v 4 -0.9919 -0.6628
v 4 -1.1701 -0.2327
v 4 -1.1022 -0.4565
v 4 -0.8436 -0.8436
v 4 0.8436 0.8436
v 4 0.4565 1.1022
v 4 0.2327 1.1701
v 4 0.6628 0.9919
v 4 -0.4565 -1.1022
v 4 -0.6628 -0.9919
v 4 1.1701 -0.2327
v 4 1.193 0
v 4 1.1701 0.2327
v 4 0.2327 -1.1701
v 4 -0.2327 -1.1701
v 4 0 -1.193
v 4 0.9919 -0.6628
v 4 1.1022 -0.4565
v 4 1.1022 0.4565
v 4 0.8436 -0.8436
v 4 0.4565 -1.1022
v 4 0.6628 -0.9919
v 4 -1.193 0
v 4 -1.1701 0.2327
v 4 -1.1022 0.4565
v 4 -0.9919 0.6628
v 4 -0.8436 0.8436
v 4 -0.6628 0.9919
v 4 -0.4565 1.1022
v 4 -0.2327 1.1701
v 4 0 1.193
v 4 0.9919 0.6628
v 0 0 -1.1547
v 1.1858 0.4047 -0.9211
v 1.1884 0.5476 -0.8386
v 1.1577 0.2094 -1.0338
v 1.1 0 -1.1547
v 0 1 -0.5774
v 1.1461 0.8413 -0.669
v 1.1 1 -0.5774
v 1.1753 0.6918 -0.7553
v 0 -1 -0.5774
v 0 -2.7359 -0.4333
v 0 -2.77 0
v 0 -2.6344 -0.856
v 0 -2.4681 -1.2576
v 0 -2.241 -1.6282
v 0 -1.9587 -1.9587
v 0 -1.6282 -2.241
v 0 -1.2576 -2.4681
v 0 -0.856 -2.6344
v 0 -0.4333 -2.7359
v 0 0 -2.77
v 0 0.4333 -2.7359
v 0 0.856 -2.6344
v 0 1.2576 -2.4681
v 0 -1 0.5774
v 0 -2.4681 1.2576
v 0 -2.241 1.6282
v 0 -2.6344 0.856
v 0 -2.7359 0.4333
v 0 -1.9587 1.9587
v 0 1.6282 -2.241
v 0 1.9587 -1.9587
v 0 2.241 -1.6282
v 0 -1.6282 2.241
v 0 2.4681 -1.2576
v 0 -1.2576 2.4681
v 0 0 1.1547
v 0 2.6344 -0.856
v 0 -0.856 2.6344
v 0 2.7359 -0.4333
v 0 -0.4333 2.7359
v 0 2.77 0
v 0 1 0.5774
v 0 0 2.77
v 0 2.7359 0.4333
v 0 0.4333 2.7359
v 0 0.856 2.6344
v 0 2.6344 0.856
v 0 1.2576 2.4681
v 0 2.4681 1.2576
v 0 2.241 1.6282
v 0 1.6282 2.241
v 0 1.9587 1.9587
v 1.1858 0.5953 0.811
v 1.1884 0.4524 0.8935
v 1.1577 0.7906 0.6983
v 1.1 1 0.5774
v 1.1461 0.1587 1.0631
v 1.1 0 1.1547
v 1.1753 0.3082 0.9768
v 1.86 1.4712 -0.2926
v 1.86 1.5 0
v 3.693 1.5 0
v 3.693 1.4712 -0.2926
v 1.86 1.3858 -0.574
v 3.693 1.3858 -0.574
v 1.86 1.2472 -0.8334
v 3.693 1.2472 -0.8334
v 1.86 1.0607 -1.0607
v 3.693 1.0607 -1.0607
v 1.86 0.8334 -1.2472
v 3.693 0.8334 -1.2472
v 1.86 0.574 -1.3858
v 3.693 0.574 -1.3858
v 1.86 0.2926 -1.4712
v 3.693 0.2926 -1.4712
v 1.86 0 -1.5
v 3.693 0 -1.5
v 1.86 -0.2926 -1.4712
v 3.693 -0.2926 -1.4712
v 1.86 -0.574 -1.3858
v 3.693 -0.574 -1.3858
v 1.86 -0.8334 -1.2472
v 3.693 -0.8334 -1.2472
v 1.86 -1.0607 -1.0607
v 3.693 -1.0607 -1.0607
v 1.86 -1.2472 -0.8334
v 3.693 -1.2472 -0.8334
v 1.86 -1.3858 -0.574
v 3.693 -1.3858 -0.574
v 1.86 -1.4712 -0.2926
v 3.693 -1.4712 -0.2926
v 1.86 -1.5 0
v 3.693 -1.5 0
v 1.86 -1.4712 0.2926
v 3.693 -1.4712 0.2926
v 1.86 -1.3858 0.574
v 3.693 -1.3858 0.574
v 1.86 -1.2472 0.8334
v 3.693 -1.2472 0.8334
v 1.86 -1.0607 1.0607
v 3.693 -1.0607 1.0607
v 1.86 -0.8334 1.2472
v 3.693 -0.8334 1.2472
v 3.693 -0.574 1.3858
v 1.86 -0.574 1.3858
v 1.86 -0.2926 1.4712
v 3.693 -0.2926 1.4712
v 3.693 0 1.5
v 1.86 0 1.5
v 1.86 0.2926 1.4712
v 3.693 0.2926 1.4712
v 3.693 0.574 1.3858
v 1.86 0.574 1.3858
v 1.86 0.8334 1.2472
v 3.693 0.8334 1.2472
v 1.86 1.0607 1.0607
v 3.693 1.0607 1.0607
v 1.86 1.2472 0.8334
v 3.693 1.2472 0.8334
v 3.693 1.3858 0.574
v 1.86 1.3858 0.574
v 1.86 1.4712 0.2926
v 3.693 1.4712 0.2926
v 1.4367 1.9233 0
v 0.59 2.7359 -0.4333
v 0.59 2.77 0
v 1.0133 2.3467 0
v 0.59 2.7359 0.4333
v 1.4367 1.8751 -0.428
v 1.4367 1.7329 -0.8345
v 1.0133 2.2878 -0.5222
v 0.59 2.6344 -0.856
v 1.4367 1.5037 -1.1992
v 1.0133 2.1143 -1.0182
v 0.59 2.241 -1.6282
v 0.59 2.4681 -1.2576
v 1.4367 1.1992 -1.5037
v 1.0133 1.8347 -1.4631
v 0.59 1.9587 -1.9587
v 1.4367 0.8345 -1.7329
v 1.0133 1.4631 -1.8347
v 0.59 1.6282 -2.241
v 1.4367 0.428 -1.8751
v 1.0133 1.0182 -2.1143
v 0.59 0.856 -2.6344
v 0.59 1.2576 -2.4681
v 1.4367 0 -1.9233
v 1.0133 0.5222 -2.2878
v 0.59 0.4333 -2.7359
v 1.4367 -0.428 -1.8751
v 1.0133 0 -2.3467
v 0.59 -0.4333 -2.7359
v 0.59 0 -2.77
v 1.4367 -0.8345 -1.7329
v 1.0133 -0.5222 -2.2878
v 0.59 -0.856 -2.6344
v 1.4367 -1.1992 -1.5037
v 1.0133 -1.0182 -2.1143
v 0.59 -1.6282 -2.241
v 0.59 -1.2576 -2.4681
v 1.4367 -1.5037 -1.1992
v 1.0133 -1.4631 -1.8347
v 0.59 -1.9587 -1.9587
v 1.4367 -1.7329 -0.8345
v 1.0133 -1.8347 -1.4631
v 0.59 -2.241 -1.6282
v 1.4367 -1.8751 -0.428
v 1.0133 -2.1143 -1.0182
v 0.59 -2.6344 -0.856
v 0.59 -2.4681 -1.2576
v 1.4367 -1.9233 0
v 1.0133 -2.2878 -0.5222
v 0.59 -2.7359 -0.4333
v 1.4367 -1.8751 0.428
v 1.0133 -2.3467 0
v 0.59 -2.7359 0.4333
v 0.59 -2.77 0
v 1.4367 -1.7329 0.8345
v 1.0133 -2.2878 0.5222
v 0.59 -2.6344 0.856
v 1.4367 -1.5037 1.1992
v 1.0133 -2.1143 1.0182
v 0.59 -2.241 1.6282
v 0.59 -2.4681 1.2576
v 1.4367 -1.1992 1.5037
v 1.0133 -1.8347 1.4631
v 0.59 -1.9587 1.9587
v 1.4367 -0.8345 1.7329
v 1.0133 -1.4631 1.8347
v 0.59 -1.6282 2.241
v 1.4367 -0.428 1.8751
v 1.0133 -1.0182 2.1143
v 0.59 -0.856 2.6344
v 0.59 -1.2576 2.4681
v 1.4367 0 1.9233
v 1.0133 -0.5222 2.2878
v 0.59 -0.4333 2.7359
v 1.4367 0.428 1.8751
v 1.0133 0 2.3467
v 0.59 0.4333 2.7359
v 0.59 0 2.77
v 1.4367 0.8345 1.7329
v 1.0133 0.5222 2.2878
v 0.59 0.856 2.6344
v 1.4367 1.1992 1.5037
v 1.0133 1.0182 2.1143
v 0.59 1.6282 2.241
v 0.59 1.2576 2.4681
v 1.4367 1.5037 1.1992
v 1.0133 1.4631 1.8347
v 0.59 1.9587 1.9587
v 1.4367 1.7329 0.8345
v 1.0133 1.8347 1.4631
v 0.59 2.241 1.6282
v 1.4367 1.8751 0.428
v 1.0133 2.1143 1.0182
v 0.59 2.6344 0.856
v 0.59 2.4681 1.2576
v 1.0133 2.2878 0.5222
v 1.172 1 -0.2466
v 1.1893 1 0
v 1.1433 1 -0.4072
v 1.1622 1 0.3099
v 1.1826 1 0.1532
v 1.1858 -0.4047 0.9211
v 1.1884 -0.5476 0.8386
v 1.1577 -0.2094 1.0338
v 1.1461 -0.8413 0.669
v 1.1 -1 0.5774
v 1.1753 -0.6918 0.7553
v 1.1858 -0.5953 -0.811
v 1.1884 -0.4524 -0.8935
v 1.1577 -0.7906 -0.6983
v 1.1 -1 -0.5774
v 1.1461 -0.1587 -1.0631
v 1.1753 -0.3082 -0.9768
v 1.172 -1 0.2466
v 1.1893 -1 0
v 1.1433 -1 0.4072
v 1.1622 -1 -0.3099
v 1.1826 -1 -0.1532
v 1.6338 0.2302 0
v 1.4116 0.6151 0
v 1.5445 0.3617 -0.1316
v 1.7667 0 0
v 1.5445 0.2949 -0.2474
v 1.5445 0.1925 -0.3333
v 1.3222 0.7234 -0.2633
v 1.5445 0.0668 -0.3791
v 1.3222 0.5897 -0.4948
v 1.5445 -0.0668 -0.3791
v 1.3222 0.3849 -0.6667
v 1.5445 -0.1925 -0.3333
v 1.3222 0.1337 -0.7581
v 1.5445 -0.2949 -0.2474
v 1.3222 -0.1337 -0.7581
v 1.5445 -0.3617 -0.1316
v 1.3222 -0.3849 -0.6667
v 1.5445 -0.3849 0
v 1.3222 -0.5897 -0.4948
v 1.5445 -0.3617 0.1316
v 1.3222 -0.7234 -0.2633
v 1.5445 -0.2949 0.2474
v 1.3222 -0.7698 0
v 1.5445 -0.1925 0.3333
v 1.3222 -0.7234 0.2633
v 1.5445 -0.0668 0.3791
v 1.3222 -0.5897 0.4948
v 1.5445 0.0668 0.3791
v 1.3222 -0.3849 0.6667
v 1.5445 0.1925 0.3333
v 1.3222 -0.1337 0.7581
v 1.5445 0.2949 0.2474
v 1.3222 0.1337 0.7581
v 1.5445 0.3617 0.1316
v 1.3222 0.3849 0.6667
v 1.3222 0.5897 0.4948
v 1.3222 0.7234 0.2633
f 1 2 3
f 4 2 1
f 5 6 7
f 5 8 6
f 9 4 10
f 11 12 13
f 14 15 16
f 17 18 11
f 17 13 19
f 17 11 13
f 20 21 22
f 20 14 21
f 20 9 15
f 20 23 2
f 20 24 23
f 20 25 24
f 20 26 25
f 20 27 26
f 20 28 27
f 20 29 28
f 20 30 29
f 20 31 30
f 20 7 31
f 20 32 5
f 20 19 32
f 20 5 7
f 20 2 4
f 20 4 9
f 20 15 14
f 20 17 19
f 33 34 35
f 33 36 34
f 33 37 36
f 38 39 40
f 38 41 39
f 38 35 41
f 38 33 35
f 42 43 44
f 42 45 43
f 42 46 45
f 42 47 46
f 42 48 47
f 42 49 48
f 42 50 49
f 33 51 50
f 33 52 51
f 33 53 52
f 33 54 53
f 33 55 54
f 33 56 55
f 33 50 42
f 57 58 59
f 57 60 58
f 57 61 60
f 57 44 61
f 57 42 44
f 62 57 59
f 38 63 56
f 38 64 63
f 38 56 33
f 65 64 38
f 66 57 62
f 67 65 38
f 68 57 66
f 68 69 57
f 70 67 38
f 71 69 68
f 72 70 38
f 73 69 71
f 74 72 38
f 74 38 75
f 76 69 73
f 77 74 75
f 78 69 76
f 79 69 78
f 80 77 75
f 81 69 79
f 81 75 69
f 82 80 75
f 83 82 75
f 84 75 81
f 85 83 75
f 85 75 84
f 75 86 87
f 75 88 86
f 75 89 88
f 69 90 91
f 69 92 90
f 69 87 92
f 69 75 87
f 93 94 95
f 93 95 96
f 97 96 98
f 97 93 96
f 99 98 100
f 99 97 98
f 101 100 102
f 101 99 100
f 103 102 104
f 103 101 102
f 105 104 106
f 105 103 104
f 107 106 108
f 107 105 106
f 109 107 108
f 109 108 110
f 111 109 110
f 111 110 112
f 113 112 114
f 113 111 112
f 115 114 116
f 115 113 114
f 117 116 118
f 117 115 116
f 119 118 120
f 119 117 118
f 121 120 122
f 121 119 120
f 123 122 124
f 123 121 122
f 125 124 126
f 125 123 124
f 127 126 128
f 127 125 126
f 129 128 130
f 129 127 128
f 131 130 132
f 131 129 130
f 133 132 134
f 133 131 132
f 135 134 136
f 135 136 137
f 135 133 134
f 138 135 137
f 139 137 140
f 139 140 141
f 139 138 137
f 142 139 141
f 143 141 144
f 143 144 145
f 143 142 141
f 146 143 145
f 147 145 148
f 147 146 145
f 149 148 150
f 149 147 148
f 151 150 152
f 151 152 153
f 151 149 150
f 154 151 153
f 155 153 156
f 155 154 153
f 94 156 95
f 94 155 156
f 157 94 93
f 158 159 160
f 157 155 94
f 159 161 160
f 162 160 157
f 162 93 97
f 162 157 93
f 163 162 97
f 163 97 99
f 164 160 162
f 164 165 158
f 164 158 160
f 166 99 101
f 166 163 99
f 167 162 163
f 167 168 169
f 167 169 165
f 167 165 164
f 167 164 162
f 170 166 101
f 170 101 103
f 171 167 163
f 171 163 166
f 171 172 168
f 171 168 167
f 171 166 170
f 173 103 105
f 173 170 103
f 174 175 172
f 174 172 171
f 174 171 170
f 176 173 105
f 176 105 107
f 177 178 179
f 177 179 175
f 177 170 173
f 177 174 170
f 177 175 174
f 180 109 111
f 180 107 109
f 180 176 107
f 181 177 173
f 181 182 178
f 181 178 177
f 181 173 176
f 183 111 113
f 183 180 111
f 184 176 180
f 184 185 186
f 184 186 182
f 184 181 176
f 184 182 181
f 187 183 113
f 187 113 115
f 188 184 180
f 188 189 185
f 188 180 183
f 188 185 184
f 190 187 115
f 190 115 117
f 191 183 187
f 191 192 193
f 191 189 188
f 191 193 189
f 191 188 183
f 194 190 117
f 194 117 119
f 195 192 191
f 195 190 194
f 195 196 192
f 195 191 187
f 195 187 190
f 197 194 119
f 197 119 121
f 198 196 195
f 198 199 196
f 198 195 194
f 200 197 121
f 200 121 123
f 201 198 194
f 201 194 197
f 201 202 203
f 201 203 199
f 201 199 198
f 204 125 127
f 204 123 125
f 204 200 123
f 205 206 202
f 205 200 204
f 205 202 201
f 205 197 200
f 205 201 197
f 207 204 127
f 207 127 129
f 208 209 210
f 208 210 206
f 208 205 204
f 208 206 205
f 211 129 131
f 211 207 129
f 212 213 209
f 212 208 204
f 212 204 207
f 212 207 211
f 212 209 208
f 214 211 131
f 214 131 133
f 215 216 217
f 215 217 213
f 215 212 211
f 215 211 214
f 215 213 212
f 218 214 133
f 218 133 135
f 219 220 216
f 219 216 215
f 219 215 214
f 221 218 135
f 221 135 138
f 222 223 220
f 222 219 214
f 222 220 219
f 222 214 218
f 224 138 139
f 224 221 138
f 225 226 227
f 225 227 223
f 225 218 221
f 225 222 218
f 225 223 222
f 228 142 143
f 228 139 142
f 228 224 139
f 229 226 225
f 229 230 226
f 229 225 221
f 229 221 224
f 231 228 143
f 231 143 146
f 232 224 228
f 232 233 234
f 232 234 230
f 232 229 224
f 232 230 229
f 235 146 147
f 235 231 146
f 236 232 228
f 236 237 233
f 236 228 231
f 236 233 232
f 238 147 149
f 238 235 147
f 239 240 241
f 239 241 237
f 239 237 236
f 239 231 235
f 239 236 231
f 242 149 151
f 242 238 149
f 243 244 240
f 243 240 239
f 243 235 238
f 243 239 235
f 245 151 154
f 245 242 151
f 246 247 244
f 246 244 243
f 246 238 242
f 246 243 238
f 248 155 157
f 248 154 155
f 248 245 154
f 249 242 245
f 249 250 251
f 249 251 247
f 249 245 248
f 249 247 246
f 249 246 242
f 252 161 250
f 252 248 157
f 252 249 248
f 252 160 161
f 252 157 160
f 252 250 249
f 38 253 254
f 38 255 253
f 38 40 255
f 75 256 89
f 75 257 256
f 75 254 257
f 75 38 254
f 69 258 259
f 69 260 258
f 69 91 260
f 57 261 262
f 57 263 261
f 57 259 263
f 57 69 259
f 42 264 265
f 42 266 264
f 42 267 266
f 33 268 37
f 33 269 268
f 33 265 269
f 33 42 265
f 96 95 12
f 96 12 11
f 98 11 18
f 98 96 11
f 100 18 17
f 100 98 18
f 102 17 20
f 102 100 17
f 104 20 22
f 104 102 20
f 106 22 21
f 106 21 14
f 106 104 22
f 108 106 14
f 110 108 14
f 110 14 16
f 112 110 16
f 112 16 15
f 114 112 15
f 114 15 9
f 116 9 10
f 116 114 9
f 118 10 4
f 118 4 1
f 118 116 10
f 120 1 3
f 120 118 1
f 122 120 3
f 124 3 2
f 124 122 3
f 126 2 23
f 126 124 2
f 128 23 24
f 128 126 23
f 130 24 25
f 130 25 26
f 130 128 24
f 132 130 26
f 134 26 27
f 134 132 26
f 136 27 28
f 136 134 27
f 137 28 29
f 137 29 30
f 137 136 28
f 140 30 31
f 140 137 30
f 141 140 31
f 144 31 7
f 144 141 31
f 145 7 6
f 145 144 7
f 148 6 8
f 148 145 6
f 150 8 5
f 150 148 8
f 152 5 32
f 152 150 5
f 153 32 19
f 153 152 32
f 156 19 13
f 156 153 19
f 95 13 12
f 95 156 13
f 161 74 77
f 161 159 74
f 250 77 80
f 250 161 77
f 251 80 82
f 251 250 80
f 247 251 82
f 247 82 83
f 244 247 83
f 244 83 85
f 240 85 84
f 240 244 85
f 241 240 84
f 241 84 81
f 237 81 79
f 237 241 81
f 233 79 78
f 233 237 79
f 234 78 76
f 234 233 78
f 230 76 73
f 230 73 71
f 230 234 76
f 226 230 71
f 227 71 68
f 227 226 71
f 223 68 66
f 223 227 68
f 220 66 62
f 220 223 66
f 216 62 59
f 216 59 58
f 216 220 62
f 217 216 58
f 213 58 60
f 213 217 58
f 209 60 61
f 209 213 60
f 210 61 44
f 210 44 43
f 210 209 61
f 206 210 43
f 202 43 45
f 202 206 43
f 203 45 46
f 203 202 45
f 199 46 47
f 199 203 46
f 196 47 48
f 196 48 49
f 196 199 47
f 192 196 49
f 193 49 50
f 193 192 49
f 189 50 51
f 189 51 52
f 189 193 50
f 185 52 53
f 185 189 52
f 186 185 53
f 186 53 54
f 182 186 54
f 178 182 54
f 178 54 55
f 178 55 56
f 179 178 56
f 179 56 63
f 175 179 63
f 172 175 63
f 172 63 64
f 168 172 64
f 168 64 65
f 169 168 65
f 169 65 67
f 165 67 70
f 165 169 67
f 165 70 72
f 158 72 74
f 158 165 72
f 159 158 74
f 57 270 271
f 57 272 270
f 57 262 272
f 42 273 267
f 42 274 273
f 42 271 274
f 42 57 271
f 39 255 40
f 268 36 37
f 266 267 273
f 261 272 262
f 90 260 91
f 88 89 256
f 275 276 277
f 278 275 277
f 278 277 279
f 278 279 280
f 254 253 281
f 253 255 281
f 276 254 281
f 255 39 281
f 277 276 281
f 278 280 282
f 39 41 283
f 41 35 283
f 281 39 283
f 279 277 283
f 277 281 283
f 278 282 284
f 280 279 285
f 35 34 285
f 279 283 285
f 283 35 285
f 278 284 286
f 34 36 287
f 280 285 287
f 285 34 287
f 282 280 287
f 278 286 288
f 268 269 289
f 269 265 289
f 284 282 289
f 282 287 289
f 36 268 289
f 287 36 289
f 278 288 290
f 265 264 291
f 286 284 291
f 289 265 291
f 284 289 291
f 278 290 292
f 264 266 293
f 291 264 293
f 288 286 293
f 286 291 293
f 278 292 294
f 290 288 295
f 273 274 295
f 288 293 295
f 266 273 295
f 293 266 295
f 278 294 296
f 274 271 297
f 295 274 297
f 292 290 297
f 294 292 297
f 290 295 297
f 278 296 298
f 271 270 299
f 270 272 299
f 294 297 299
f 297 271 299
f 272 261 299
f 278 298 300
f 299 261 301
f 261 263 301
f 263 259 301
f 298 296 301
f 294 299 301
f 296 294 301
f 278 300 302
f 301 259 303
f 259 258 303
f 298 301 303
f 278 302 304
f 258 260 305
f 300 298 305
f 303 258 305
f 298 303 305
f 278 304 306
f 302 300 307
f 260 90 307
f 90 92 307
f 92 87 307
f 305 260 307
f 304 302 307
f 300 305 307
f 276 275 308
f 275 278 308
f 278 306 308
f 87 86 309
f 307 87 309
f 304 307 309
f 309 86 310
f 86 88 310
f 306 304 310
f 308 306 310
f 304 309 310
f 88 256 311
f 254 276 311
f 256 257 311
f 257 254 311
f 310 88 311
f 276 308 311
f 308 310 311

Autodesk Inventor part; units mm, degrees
ref_plane "YZ Plane" through (0, 0, 0) normal (1, 0, 0) x (0, 1, 0)
ref_plane "XZ Plane" through (0, 0, 0) normal (0, 1, 0) x (-1, 0, 0)
sketch "Skizze1" plane through (0, 0, 0) normal (0, 0, 1) x (1, 0, 0)
  line L0 (8, 0) -> (8, 1.5)
  line L1 (8, 1.5) -> (3.36, 1.5)
  line L2 (3.36, 1.5) -> (3.0533, 1.5)
  line L3 (0, 2.77) -> (0, 1.1547)
  line L4 (0, 1.1547) -> (1.1, 1.1547)
  line L5 (1.1, 1.1547) -> (1.7667, 0)
  line L6 (1.7667, 0) -> (8, 0)
  line L7 (0, 2.77) -> (0.59, 2.77)
  line L8 (0.59, 2.77) -> (1.86, 1.5)
  line L9 (3.0533, 1.5) -> (1.86, 1.5)
  line L10 (3.36, 1.5) -> (1.86, 1.5) construction
  line L11 (1.86, 1.5) -> (1.86, 1.5)
  line L12 (-1.6, 0) -> (9.6, 0) projected
  line L13 (0, -0.554) -> (0, 3.324) projected
  dimension "d0" = 8
  dimension "d1" = 4.64
  dimension "d2" = 1.1
  dimension "d3" = 3
  dimension "d6" = 1.86
  dimension "d7" = 45
  dimension "d8" = 2.3094
  dimension "d9" = 60
  dimension "d10" = 5.54
  dimension "d11" = 3
  dimension "d12" = 0.3067
revolve "Körper" add sketch "Skizze1" angle 360 about axis through (1.7667, 0, 0) along (1, 0, 0) contours L6 L5 L4 L3 L7 L8 L9 L2 L1 L0
sketch "Skizze2" plane through (0, 0, 0) normal (-1, 0, 0) x (0, 0, 1)
  circle A0 centre (0, 0) radius 1.1547 projected
  line L0 (0, -3.878) -> (0, 3.878) projected
  line L1 (-3.878, 0) -> (3.878, 0) projected
  line L2 (1.1547, 0) -> (0.5774, -1)
  line L3 (0.5774, -1) -> (-0.5774, -1)
  line L4 (-0.5774, -1) -> (-1.1547, 0)
  line L5 (-1.1547, 0) -> (-0.5774, 1)
  line L6 (-0.5774, 1) -> (0.5774, 1)
  line L7 (0.5774, 1) -> (1.1547, 0)
  point P0 (0, 1.1547)
extrude "Loch" add sketch "Skizze2" against normal up to next contours L7 A0 | A0 L2 | L6 L0 A0 | A0 L0 L3 | L0 L6 A0 | A0 L3 L0 | L4 A0 | A0 L5
thread "Gewinde" size "M3x0.5" class "6g" standard "ISO Metric profile" full length
ref_plane "Work Plane1" through (104.775, 0, 0) normal (0, 0, -1) x (1, 0, 0)
chamfer "Fase1" distance 0.3067 distance2 0.3067 1 edges at (8, -1.5, 0) measured on face at (8, -0.8298, -0.2045)
sketch "Skizze4" plane through (8, 0, 0) normal (1, 0, 0) x (0, 0, -1)
  circle A0 centre (0, 0) radius 1.5
extrude "Extrusion3" cut sketch "Skizze4" against normal blind 4
chamfer "Fasen3" distance 0.307 angle 45 1 edges at (4, -1.5, 0)
equation "\"d17\" = -0.5 * SPD + 0.5 * GD"
equation "\"d18\" = GUL"
equation "\"d0\" = NLG"
equation "\"d1\" = GEL"
equation "\"d2\" = INTI"
equation "\"d3\" = GD"
equation "\"d6\" = KOH"
equation "\"d7\" = 0.5 * SEWI"
equation "\"d8\" = 1.1547 * SW"
equation "\"d10\" = KOD"
equation "\"d11\" = BDM"
equation "\"d12\" = GAL"
equation "\"NLG\" = 8"
equation "\"INTI\" = 1.1"
equation "\"GEL\" = 4.64"
equation "\"GAL\" = 0.61345 * PTC"
equation "\"KOH\" = 1.86"
equation "\"KOD\" = 5.54"
equation "\"GUL\" = 0.61345 * PTC"
equation "\"SPD\" = NND - 1.2269 * PTC"
equation "\"BDM\" = NND"
equation "\"GD\" = NND"
equation "\"SEWI\" = 90deg"
equation "\"SW\" = 2"
equation "\"TOA\" = 30deg"
equation "\"GD1\" = THREADDIA - 1.2269 * PTC"
equation "\"EPV\" = 3.36"
equation "\"THREADDIA\" = 3"
equation "\"PTC\" = 0.5"
equation "\"NND\" = 3"
equation "\"E0\" = 2.31"
properties part number "ISO 10642  - M3  x  8" material "Stahl"
